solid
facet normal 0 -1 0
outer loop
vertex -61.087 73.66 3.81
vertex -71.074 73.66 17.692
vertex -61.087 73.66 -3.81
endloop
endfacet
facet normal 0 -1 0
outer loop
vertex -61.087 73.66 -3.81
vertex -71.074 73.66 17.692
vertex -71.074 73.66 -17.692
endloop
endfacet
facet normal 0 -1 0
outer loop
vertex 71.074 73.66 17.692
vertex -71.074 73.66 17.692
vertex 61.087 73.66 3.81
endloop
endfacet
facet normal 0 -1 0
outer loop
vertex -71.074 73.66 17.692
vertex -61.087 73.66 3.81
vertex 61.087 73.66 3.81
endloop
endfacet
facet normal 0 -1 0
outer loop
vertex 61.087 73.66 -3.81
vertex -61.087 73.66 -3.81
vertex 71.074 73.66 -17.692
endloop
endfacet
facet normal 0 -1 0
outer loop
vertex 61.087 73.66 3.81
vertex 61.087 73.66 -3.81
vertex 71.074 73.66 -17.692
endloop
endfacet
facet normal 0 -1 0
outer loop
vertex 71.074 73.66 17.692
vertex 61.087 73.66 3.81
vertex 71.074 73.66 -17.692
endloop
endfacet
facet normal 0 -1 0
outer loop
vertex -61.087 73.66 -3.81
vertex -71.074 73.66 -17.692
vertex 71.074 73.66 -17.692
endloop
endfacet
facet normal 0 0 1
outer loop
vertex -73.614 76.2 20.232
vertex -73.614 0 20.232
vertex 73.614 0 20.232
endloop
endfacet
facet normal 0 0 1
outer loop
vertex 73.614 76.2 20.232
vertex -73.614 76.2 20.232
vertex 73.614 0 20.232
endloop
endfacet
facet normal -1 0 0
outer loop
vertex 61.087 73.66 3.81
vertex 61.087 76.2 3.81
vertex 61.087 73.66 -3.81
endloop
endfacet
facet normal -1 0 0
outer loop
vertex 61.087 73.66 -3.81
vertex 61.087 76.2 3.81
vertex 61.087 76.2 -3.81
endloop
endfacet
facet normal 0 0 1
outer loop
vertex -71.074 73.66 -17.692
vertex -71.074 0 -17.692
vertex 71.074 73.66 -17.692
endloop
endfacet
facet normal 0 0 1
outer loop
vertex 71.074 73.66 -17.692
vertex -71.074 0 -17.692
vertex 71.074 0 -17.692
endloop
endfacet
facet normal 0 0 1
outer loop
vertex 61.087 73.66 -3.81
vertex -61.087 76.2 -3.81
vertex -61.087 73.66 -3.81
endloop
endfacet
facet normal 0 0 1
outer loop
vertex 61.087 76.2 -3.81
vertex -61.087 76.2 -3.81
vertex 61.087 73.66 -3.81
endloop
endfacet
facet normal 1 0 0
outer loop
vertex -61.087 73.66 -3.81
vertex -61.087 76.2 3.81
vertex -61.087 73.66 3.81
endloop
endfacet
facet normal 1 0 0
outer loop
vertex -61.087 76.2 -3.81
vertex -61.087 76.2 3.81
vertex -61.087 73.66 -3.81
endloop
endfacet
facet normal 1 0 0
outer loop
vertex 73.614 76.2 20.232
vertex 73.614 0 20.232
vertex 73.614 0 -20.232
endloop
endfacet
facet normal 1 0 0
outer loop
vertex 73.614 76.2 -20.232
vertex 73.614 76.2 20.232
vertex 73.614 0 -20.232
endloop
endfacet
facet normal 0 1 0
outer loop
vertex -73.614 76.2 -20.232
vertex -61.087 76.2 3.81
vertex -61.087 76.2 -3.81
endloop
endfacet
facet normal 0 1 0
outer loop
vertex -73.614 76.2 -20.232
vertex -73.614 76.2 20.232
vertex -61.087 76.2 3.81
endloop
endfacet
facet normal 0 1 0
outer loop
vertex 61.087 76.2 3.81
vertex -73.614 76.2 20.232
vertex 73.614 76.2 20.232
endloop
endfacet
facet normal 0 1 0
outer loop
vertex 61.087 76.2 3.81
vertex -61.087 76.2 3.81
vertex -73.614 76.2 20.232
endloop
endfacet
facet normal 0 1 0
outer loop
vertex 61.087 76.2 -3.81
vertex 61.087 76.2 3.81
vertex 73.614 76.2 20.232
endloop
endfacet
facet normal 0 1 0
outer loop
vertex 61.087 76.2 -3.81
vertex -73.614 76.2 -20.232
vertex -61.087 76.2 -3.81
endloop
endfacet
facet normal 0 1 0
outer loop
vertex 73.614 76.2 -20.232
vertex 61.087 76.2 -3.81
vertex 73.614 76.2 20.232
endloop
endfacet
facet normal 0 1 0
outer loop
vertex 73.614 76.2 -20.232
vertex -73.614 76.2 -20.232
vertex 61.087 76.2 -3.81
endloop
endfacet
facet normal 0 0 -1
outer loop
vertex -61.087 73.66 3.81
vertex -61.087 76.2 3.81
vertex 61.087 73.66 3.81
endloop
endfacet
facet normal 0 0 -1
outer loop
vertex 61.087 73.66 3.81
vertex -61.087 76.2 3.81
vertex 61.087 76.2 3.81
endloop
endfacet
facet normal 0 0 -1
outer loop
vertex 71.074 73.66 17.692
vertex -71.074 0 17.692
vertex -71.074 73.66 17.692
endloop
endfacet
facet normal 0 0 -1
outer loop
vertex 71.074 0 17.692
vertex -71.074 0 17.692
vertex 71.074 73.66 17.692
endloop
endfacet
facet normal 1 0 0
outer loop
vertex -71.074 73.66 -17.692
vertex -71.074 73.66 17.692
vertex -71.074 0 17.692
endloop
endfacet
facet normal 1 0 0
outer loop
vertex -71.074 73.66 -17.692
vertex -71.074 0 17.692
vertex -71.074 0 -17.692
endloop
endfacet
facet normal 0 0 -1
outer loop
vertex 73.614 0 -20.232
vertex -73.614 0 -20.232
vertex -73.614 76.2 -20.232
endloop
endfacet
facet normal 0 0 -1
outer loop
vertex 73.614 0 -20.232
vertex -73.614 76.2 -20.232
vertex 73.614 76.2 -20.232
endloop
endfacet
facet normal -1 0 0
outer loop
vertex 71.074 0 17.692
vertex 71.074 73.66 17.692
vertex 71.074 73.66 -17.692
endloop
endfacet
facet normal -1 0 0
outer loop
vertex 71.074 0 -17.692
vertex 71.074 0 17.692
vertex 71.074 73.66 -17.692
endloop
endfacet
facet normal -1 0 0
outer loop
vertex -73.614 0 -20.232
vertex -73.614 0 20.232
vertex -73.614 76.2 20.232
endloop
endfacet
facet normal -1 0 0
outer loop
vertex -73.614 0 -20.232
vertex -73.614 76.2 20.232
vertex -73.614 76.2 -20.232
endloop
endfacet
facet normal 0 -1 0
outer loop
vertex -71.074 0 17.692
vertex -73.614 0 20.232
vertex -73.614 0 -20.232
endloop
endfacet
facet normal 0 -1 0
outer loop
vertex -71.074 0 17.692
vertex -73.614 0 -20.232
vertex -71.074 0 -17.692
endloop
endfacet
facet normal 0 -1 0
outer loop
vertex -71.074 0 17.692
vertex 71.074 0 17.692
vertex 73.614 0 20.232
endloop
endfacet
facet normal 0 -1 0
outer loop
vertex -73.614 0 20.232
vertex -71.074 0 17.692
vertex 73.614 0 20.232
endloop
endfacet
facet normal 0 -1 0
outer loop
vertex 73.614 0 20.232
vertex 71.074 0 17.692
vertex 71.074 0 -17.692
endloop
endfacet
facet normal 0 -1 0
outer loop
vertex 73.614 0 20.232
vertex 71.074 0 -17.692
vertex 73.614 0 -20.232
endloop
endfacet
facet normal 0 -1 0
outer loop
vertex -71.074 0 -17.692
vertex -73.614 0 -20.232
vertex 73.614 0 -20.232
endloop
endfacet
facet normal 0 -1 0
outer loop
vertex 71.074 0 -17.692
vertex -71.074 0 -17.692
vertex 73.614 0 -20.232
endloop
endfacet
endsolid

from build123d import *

# Parameters (mm, degrees)
SKETCH1_W           = 147.22869713
SKETCH1_H           = 40.463516098
BOSS_EXTRUDE1_DEPTH = 76.2
SHELL1_T            = -2.54
SKETCH2_W           = 122.174
SKETCH2_H           = 7.62
CUT_EXTRUDE1_DEPTH  = 2.54


with BuildPart() as part:
    # Sketch1 → Boss-Extrude1 (new body)
    with BuildSketch(Plane(origin=(0, 0, 0), x_dir=(1, 0, 0), z_dir=(0, 1, 0))):
        Rectangle(SKETCH1_W, SKETCH1_H)
    extrude(amount=BOSS_EXTRUDE1_DEPTH)

    # Shell1
    shell1_openings = [part.faces().sort_by_distance(p)[0] for p in [
        (0, 0, 0),
    ]]
    offset(amount=SHELL1_T, openings=shell1_openings, kind=Kind.INTERSECTION)

    # Sketch2 → Cut-Extrude1 (cut)
    with BuildSketch(Plane(origin=(0, 76.2, 0), x_dir=(1, 0, 0), z_dir=(0, 1, 0))):
        Rectangle(SKETCH2_W, SKETCH2_H)
    extrude(amount=-CUT_EXTRUDE1_DEPTH, mode=Mode.SUBTRACT)


solid = part.part
